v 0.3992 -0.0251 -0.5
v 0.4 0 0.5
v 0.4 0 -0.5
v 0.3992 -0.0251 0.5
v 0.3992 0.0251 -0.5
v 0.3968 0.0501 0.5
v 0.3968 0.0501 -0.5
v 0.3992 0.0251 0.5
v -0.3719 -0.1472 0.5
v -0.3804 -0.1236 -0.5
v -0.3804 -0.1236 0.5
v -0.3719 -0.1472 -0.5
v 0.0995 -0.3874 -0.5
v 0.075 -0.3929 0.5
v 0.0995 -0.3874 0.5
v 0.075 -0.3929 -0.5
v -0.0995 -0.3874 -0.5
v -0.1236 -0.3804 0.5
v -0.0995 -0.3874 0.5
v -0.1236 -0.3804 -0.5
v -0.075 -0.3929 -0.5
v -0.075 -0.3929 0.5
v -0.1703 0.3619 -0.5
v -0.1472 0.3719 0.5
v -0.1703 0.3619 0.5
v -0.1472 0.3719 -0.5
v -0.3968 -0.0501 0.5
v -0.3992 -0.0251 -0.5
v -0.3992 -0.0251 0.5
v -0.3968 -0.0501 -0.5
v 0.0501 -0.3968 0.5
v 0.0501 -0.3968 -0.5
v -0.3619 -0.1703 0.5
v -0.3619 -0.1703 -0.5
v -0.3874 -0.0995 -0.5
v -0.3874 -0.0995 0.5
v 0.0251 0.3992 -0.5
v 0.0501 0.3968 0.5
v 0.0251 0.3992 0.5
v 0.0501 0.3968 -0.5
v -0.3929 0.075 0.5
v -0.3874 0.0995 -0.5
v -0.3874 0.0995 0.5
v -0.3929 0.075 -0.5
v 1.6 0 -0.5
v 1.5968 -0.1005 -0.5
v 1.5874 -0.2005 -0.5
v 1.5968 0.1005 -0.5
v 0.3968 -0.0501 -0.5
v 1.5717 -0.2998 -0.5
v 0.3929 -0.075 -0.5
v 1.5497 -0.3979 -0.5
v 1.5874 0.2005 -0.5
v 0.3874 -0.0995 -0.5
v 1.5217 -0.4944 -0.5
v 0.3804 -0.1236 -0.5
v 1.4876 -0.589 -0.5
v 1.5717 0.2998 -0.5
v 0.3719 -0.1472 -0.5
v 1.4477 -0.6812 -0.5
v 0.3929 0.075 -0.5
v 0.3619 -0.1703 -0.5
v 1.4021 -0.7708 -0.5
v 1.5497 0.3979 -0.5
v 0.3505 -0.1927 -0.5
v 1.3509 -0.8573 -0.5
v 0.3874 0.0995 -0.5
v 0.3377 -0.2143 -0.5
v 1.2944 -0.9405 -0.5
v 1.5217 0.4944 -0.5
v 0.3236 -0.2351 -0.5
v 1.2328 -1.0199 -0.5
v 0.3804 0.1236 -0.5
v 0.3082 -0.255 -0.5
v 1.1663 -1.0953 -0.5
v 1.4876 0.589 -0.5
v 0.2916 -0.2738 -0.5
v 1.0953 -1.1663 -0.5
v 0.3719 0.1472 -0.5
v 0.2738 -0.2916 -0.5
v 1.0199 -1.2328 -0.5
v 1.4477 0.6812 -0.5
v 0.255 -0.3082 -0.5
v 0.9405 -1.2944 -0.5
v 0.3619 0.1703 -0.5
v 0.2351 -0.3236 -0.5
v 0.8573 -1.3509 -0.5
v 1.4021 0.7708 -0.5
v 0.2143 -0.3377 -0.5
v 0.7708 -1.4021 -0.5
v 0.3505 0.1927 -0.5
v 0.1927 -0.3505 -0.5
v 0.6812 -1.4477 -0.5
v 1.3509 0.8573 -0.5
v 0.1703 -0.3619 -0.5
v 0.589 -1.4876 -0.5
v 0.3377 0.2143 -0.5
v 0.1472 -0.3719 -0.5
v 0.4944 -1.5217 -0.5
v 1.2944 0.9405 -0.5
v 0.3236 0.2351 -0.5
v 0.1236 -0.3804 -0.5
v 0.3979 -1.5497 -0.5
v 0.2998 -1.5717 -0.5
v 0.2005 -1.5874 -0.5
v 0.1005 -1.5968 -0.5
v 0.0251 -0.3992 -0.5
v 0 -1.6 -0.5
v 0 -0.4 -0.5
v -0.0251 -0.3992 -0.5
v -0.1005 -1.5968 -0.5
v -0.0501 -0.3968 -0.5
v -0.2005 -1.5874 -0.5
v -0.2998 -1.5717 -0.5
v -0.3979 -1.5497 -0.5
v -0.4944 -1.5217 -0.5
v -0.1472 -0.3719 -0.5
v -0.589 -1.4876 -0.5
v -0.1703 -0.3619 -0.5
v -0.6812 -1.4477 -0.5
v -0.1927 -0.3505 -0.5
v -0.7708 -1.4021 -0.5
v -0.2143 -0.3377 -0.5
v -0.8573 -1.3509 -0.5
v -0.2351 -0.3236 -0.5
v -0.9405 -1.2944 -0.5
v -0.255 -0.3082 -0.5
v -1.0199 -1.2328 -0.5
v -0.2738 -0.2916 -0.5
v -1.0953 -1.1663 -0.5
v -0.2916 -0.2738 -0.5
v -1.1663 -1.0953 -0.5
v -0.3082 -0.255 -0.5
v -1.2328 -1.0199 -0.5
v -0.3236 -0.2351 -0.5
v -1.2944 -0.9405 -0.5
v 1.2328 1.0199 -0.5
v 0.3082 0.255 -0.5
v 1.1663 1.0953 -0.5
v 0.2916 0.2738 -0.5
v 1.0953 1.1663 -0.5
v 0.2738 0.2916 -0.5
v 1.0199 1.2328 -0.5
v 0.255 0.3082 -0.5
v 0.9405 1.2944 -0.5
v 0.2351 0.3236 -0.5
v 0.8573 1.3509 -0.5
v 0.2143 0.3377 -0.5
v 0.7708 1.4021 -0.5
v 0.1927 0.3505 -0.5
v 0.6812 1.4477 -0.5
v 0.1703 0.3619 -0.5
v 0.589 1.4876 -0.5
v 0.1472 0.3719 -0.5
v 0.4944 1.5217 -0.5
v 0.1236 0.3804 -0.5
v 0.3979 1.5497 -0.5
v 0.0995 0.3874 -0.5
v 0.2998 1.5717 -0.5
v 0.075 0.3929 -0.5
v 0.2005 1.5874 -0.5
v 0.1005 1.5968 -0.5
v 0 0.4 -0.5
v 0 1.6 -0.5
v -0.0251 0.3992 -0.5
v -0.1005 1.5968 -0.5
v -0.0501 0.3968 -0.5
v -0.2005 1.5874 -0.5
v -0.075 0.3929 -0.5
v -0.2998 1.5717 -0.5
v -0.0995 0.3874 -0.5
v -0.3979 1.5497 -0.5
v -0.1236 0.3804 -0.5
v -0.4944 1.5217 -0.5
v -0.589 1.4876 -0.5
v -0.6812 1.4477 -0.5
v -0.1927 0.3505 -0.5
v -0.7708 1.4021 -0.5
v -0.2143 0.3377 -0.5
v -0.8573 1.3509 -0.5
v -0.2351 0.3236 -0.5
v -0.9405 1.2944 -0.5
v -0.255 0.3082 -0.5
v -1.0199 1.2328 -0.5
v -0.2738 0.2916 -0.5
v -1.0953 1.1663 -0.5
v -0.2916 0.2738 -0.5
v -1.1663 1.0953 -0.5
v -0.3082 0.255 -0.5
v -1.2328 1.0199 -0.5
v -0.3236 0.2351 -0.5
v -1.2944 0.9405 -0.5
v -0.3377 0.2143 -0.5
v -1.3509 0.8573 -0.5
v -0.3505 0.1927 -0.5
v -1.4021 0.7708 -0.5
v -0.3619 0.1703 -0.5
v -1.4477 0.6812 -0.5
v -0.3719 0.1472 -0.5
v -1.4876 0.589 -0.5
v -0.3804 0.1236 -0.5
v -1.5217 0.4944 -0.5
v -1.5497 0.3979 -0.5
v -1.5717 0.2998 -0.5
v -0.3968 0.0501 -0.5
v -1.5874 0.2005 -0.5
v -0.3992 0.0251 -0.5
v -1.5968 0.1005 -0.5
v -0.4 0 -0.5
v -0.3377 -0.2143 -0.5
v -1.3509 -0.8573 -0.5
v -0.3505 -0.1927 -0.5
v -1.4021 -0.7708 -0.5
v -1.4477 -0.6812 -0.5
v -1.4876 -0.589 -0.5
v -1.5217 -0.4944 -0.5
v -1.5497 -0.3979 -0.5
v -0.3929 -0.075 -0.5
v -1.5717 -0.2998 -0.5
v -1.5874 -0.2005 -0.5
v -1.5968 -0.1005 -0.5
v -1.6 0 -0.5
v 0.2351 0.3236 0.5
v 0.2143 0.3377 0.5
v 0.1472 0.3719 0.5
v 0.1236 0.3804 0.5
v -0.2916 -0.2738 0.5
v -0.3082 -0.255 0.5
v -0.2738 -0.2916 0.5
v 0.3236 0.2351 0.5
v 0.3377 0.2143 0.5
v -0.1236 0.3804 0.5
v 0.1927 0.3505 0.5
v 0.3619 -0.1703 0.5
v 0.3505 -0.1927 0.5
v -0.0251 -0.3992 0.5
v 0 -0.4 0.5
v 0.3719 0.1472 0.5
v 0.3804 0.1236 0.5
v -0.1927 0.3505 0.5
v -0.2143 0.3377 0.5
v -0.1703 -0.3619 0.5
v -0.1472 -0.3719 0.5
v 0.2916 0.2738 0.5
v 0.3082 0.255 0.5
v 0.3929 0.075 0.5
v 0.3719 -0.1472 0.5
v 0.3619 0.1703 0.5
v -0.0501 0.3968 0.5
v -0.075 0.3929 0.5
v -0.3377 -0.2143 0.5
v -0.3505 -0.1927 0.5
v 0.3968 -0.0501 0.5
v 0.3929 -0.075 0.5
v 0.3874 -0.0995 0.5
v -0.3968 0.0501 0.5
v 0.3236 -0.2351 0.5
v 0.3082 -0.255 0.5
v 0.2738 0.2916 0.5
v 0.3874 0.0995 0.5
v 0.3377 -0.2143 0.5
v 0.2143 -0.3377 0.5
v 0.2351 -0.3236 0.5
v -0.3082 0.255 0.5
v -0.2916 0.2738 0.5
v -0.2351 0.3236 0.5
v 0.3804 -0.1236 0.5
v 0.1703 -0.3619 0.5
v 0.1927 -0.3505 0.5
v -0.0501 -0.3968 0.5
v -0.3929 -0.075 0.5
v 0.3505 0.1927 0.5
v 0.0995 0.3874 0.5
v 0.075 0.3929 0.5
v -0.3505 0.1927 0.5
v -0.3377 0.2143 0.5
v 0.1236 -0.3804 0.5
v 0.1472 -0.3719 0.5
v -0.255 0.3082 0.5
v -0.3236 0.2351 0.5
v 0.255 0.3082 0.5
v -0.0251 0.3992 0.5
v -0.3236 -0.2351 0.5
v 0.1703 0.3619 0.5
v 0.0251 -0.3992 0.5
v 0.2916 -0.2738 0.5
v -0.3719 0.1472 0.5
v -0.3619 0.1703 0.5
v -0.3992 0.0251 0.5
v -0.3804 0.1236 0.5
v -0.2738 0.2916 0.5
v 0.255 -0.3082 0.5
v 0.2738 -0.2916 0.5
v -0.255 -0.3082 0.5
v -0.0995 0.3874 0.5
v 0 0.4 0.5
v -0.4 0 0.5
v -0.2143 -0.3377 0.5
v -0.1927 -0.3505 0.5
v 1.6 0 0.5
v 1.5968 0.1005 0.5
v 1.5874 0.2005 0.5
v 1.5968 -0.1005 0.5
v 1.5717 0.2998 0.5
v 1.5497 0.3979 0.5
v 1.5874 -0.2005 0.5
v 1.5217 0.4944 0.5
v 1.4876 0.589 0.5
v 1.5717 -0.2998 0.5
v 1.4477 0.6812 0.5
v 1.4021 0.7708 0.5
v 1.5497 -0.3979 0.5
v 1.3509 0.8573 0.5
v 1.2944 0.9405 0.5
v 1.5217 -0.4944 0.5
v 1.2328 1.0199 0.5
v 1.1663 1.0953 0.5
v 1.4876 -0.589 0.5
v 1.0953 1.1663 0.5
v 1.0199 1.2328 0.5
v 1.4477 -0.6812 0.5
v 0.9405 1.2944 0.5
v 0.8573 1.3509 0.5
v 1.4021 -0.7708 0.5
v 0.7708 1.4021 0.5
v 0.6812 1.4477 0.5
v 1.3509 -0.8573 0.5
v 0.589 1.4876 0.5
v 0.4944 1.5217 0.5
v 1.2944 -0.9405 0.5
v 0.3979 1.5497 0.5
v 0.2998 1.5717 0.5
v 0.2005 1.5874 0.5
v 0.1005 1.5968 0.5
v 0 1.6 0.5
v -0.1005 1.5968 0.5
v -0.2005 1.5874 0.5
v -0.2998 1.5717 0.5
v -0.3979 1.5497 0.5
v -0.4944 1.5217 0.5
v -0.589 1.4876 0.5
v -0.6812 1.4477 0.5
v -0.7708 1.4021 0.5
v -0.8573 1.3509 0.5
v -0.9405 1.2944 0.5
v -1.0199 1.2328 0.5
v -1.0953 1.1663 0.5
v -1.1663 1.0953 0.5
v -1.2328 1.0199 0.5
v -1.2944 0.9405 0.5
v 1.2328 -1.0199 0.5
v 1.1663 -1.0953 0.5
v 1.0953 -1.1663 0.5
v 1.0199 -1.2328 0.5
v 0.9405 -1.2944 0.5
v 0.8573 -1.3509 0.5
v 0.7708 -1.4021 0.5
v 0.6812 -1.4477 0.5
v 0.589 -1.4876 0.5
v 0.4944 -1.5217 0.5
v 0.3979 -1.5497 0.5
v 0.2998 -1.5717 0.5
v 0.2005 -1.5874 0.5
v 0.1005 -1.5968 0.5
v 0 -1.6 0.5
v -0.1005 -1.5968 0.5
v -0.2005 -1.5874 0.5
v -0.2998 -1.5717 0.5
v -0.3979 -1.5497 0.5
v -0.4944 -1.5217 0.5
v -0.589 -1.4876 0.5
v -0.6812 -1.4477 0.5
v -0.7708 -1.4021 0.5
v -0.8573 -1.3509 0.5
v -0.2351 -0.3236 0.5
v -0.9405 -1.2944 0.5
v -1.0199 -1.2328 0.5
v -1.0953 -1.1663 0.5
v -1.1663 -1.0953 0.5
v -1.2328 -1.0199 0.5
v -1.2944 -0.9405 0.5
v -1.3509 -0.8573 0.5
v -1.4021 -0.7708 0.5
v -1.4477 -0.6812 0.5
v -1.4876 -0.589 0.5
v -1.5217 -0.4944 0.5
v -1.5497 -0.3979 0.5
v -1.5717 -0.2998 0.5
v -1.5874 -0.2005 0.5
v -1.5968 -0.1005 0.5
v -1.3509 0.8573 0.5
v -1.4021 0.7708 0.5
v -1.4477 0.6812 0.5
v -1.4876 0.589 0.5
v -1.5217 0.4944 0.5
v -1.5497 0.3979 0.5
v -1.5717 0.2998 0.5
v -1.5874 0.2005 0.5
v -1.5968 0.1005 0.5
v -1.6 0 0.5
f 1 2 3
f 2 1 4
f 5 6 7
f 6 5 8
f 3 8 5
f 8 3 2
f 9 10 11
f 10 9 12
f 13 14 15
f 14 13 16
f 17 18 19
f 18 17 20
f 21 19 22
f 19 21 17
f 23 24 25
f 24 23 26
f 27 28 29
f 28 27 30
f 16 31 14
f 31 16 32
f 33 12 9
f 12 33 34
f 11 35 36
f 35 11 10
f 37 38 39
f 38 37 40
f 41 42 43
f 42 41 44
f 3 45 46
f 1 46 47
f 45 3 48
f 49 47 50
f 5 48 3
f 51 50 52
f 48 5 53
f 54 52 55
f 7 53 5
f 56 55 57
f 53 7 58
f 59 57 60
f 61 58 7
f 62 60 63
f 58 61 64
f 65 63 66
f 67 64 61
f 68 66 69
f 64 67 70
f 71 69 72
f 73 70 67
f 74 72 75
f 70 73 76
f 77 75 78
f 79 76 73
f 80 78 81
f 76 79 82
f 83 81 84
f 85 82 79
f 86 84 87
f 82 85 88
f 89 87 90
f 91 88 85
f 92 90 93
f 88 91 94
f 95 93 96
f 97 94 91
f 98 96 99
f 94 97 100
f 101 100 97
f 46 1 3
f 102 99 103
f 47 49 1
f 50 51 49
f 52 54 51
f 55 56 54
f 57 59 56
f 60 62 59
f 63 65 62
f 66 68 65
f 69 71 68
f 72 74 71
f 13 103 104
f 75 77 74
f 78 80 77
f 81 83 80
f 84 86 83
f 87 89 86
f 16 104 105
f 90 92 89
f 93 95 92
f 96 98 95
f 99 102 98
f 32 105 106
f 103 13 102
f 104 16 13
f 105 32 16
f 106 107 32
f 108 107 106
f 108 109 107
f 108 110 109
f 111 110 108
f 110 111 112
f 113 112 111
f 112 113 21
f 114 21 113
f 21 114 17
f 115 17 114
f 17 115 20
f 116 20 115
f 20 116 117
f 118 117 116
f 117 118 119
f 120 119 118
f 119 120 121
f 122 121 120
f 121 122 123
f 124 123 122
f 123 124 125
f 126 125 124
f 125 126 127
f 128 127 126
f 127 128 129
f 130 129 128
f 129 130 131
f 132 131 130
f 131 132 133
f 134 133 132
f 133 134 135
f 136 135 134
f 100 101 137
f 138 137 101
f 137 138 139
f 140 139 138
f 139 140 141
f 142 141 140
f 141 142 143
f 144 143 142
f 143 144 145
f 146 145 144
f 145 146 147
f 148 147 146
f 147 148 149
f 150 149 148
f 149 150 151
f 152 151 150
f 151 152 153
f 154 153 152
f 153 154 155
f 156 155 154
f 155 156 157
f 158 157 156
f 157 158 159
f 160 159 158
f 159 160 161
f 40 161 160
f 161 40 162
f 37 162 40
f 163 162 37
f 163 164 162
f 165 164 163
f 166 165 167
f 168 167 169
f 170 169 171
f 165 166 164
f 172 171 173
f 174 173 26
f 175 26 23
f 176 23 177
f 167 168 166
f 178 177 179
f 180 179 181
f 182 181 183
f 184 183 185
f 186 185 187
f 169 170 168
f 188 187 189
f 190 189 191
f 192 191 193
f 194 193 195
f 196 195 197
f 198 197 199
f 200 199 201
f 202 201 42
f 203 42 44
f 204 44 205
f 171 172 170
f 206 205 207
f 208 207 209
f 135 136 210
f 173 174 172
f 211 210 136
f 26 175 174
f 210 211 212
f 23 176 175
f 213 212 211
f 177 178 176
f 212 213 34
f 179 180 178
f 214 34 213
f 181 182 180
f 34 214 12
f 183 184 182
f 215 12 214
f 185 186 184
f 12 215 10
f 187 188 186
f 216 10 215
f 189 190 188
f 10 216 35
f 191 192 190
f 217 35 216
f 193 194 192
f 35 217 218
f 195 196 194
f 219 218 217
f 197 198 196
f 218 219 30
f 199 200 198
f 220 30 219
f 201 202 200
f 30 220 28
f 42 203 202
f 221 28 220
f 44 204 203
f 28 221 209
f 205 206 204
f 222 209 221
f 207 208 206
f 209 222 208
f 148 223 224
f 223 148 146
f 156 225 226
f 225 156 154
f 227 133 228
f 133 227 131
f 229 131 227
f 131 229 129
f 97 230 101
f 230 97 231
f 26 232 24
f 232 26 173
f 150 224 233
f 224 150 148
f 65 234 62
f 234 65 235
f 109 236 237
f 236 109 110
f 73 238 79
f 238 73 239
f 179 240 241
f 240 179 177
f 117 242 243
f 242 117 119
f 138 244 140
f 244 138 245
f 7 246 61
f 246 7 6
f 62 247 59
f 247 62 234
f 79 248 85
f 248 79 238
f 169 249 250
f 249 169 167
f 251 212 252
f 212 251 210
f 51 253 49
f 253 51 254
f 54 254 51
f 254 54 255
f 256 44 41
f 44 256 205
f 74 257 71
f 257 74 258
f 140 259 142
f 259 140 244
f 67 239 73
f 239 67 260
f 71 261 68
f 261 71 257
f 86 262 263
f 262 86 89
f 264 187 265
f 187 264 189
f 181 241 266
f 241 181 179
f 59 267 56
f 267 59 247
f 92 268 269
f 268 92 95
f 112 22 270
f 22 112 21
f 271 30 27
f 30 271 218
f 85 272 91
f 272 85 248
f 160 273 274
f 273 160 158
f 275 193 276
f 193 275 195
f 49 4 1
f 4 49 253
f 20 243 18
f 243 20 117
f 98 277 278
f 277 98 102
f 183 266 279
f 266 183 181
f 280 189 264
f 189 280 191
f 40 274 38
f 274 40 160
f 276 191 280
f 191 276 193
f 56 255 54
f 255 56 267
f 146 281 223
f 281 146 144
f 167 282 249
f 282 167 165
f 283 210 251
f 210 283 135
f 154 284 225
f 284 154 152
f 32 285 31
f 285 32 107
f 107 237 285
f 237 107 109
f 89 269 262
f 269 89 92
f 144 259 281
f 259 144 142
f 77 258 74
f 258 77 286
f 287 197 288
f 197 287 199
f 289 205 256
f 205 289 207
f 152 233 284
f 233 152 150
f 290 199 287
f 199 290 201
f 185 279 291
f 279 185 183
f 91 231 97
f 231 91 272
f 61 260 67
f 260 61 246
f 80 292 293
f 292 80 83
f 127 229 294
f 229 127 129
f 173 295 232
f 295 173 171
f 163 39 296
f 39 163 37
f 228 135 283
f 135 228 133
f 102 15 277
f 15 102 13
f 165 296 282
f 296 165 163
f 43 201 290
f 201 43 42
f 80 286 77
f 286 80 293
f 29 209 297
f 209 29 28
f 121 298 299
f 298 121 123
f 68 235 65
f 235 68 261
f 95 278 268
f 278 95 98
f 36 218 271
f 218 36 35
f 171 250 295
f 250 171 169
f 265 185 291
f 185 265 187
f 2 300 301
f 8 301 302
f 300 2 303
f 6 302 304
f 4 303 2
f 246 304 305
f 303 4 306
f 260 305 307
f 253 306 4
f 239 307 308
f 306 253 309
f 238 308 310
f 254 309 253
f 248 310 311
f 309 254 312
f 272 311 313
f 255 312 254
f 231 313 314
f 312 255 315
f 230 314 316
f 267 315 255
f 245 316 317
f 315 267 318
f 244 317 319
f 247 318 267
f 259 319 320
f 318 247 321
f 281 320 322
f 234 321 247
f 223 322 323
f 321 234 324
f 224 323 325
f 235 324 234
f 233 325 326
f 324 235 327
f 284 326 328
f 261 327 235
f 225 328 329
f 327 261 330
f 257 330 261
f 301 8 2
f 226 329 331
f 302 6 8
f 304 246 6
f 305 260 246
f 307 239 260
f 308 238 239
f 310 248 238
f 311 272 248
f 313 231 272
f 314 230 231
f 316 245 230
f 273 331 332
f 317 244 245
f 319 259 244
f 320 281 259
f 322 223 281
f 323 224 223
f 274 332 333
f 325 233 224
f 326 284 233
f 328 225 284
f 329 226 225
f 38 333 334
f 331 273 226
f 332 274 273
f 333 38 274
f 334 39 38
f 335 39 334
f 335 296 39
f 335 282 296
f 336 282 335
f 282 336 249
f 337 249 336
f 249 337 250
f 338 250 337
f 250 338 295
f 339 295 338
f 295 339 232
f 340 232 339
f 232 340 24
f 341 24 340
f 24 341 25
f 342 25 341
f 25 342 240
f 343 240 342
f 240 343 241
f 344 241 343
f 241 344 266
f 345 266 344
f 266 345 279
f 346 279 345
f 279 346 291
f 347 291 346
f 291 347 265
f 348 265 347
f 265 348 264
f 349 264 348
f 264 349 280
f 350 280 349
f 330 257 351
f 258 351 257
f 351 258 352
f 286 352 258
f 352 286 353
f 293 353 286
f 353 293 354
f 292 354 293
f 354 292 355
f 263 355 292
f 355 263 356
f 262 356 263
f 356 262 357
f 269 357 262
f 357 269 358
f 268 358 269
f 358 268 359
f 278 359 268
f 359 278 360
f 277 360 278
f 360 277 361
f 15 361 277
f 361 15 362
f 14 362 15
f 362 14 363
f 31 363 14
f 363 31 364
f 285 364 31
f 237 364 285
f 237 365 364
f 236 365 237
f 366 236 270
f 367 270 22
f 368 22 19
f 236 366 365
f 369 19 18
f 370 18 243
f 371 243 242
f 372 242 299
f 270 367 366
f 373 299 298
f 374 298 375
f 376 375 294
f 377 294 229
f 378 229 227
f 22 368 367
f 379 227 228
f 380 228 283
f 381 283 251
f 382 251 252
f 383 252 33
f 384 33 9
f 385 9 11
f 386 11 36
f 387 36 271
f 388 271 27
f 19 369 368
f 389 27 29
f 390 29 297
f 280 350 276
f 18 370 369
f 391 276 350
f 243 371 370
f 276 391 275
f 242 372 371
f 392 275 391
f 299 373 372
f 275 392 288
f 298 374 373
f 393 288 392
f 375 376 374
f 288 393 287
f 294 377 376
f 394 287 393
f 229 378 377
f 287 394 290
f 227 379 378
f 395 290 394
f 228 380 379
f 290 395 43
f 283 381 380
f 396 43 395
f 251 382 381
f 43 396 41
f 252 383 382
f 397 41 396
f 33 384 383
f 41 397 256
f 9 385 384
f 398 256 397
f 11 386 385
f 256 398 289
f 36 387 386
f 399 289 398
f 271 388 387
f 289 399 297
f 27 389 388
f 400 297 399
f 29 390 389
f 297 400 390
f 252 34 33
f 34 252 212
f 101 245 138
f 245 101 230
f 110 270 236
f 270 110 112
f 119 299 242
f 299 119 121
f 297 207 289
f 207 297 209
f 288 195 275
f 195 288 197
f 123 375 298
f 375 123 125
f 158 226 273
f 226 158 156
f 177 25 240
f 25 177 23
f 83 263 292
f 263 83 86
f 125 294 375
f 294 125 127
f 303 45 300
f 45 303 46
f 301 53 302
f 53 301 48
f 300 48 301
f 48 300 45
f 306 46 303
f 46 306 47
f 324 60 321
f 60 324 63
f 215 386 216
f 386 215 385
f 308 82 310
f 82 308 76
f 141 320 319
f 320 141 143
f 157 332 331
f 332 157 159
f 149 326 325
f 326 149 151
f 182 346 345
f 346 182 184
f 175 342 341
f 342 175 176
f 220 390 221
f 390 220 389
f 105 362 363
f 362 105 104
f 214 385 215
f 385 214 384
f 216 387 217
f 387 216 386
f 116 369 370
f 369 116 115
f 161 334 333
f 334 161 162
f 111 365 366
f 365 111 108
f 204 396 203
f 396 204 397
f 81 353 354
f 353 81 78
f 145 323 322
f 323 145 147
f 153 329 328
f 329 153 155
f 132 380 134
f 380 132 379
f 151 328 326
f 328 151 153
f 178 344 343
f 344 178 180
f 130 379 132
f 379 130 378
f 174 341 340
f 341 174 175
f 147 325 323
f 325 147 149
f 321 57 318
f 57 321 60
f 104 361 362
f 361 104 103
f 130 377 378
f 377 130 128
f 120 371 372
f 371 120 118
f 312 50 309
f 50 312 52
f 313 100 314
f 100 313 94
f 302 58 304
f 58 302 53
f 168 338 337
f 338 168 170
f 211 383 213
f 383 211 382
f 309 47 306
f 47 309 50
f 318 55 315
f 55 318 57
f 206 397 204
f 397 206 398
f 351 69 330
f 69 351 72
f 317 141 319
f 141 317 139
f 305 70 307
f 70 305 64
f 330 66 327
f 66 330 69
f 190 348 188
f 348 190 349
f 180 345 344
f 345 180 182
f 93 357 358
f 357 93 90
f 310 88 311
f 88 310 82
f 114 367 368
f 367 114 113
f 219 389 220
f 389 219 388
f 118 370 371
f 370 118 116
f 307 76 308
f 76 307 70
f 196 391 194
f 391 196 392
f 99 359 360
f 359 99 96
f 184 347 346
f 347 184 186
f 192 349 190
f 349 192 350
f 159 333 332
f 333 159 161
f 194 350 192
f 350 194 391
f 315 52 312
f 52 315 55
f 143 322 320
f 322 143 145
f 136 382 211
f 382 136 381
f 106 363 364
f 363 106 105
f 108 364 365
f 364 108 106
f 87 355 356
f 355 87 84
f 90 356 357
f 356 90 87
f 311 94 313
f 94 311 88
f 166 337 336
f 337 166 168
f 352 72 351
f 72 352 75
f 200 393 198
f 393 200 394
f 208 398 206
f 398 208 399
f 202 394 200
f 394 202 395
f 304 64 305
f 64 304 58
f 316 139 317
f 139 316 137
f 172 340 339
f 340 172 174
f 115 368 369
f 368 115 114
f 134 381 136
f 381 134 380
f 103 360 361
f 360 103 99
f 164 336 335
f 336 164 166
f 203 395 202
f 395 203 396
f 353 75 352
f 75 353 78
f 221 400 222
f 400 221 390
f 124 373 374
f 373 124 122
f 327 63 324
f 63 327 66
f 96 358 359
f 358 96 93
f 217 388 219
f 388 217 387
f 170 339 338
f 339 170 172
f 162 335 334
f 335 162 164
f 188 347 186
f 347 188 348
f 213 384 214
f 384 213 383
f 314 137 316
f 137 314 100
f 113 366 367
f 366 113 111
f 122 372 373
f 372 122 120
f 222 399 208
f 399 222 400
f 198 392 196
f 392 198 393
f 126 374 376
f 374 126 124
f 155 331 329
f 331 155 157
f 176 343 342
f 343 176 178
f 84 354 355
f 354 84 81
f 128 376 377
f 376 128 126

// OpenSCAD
// file: motor.scad
use <excentric.scad>

debug = ["asm"];

$fn=100;
motor_l = 11.8;
motor_d = 4;
front_circle_h = 0.7;
front_circle_d = 1.5;
axle_d = 0.4;
axle_h = 2.5;

excentric_eps_h = 0.4;

wire_h = 0.7;

function get_motor_property(which) =
    which == "MotorL" ? motor_l :
    which == "MotorD" ? motor_d :
    which == "FrontCircleH" ? front_circle_h :
    which == "FrontCircleD" ? front_circle_d :
    which == "AxleD" ? axle_d :
    which == "AxleH" ? axle_h :
    which == "ExcentricEpsH" ? excentric_eps_h :
    which == "FullLength" ? motor_l+front_circle_h+excentric_eps_h+axle_h:
    which == "WireH" ? wire_h :
    assert(false, str("motor haven't property ", which));


module motor(eps) {
    cylinder(d = motor_d+eps[1], h = motor_l+eps[0]);
    translate([0,0,motor_l+eps[0]]) {
        cylinder(d = front_circle_d+eps[1], h = front_circle_h);
        translate([0,0,front_circle_h])
            cylinder(d = axle_d+eps[1], h = axle_h+eps[0]/2);

    }
}

module motor_asm(eps_motor = [0,0], eps_exc = [0,0], solid = false ) {
    motor(eps_motor);
    translate([0,0,motor_l+front_circle_h+excentric_eps_h])
        excentric(eps_exc, solid);

}


for(val = debug) {
    if(val == "motor")
        motor();
    if(val == "asm")
        motor_asm();
}
// main file
use <motor.scad>

debug = ["excentric"];
$fn=100;

eps_h = get_motor_property("ExcentricEpsH");
r = 4;
h = get_motor_property("AxleH")-eps_h;
hole_d = 0.8;

module connector(eps) {
    difference() {
        cylinder(d=4*hole_d, h=h+eps[1], center=true);
        cylinder(d=hole_d, h=h+eps[1], center=true);
    }
}

module excentric(eps, solid) {
    patch_r = r + eps[0];
    patch_h = h + eps[1];
    translate([0,0,patch_h/2]) {
        difference() {
            cylinder(r=patch_r, h=patch_h, center=true);
            if(!solid) {
                translate([r,0,0])
                    cube([2*patch_r,2*patch_r,patch_h],center=true);
                cylinder(d=hole_d, h=patch_h, center=true);
            }
        }
        connector(eps);
    }
}


for(val = debug) {
    if(val == "excentric")
        excentric();
}
